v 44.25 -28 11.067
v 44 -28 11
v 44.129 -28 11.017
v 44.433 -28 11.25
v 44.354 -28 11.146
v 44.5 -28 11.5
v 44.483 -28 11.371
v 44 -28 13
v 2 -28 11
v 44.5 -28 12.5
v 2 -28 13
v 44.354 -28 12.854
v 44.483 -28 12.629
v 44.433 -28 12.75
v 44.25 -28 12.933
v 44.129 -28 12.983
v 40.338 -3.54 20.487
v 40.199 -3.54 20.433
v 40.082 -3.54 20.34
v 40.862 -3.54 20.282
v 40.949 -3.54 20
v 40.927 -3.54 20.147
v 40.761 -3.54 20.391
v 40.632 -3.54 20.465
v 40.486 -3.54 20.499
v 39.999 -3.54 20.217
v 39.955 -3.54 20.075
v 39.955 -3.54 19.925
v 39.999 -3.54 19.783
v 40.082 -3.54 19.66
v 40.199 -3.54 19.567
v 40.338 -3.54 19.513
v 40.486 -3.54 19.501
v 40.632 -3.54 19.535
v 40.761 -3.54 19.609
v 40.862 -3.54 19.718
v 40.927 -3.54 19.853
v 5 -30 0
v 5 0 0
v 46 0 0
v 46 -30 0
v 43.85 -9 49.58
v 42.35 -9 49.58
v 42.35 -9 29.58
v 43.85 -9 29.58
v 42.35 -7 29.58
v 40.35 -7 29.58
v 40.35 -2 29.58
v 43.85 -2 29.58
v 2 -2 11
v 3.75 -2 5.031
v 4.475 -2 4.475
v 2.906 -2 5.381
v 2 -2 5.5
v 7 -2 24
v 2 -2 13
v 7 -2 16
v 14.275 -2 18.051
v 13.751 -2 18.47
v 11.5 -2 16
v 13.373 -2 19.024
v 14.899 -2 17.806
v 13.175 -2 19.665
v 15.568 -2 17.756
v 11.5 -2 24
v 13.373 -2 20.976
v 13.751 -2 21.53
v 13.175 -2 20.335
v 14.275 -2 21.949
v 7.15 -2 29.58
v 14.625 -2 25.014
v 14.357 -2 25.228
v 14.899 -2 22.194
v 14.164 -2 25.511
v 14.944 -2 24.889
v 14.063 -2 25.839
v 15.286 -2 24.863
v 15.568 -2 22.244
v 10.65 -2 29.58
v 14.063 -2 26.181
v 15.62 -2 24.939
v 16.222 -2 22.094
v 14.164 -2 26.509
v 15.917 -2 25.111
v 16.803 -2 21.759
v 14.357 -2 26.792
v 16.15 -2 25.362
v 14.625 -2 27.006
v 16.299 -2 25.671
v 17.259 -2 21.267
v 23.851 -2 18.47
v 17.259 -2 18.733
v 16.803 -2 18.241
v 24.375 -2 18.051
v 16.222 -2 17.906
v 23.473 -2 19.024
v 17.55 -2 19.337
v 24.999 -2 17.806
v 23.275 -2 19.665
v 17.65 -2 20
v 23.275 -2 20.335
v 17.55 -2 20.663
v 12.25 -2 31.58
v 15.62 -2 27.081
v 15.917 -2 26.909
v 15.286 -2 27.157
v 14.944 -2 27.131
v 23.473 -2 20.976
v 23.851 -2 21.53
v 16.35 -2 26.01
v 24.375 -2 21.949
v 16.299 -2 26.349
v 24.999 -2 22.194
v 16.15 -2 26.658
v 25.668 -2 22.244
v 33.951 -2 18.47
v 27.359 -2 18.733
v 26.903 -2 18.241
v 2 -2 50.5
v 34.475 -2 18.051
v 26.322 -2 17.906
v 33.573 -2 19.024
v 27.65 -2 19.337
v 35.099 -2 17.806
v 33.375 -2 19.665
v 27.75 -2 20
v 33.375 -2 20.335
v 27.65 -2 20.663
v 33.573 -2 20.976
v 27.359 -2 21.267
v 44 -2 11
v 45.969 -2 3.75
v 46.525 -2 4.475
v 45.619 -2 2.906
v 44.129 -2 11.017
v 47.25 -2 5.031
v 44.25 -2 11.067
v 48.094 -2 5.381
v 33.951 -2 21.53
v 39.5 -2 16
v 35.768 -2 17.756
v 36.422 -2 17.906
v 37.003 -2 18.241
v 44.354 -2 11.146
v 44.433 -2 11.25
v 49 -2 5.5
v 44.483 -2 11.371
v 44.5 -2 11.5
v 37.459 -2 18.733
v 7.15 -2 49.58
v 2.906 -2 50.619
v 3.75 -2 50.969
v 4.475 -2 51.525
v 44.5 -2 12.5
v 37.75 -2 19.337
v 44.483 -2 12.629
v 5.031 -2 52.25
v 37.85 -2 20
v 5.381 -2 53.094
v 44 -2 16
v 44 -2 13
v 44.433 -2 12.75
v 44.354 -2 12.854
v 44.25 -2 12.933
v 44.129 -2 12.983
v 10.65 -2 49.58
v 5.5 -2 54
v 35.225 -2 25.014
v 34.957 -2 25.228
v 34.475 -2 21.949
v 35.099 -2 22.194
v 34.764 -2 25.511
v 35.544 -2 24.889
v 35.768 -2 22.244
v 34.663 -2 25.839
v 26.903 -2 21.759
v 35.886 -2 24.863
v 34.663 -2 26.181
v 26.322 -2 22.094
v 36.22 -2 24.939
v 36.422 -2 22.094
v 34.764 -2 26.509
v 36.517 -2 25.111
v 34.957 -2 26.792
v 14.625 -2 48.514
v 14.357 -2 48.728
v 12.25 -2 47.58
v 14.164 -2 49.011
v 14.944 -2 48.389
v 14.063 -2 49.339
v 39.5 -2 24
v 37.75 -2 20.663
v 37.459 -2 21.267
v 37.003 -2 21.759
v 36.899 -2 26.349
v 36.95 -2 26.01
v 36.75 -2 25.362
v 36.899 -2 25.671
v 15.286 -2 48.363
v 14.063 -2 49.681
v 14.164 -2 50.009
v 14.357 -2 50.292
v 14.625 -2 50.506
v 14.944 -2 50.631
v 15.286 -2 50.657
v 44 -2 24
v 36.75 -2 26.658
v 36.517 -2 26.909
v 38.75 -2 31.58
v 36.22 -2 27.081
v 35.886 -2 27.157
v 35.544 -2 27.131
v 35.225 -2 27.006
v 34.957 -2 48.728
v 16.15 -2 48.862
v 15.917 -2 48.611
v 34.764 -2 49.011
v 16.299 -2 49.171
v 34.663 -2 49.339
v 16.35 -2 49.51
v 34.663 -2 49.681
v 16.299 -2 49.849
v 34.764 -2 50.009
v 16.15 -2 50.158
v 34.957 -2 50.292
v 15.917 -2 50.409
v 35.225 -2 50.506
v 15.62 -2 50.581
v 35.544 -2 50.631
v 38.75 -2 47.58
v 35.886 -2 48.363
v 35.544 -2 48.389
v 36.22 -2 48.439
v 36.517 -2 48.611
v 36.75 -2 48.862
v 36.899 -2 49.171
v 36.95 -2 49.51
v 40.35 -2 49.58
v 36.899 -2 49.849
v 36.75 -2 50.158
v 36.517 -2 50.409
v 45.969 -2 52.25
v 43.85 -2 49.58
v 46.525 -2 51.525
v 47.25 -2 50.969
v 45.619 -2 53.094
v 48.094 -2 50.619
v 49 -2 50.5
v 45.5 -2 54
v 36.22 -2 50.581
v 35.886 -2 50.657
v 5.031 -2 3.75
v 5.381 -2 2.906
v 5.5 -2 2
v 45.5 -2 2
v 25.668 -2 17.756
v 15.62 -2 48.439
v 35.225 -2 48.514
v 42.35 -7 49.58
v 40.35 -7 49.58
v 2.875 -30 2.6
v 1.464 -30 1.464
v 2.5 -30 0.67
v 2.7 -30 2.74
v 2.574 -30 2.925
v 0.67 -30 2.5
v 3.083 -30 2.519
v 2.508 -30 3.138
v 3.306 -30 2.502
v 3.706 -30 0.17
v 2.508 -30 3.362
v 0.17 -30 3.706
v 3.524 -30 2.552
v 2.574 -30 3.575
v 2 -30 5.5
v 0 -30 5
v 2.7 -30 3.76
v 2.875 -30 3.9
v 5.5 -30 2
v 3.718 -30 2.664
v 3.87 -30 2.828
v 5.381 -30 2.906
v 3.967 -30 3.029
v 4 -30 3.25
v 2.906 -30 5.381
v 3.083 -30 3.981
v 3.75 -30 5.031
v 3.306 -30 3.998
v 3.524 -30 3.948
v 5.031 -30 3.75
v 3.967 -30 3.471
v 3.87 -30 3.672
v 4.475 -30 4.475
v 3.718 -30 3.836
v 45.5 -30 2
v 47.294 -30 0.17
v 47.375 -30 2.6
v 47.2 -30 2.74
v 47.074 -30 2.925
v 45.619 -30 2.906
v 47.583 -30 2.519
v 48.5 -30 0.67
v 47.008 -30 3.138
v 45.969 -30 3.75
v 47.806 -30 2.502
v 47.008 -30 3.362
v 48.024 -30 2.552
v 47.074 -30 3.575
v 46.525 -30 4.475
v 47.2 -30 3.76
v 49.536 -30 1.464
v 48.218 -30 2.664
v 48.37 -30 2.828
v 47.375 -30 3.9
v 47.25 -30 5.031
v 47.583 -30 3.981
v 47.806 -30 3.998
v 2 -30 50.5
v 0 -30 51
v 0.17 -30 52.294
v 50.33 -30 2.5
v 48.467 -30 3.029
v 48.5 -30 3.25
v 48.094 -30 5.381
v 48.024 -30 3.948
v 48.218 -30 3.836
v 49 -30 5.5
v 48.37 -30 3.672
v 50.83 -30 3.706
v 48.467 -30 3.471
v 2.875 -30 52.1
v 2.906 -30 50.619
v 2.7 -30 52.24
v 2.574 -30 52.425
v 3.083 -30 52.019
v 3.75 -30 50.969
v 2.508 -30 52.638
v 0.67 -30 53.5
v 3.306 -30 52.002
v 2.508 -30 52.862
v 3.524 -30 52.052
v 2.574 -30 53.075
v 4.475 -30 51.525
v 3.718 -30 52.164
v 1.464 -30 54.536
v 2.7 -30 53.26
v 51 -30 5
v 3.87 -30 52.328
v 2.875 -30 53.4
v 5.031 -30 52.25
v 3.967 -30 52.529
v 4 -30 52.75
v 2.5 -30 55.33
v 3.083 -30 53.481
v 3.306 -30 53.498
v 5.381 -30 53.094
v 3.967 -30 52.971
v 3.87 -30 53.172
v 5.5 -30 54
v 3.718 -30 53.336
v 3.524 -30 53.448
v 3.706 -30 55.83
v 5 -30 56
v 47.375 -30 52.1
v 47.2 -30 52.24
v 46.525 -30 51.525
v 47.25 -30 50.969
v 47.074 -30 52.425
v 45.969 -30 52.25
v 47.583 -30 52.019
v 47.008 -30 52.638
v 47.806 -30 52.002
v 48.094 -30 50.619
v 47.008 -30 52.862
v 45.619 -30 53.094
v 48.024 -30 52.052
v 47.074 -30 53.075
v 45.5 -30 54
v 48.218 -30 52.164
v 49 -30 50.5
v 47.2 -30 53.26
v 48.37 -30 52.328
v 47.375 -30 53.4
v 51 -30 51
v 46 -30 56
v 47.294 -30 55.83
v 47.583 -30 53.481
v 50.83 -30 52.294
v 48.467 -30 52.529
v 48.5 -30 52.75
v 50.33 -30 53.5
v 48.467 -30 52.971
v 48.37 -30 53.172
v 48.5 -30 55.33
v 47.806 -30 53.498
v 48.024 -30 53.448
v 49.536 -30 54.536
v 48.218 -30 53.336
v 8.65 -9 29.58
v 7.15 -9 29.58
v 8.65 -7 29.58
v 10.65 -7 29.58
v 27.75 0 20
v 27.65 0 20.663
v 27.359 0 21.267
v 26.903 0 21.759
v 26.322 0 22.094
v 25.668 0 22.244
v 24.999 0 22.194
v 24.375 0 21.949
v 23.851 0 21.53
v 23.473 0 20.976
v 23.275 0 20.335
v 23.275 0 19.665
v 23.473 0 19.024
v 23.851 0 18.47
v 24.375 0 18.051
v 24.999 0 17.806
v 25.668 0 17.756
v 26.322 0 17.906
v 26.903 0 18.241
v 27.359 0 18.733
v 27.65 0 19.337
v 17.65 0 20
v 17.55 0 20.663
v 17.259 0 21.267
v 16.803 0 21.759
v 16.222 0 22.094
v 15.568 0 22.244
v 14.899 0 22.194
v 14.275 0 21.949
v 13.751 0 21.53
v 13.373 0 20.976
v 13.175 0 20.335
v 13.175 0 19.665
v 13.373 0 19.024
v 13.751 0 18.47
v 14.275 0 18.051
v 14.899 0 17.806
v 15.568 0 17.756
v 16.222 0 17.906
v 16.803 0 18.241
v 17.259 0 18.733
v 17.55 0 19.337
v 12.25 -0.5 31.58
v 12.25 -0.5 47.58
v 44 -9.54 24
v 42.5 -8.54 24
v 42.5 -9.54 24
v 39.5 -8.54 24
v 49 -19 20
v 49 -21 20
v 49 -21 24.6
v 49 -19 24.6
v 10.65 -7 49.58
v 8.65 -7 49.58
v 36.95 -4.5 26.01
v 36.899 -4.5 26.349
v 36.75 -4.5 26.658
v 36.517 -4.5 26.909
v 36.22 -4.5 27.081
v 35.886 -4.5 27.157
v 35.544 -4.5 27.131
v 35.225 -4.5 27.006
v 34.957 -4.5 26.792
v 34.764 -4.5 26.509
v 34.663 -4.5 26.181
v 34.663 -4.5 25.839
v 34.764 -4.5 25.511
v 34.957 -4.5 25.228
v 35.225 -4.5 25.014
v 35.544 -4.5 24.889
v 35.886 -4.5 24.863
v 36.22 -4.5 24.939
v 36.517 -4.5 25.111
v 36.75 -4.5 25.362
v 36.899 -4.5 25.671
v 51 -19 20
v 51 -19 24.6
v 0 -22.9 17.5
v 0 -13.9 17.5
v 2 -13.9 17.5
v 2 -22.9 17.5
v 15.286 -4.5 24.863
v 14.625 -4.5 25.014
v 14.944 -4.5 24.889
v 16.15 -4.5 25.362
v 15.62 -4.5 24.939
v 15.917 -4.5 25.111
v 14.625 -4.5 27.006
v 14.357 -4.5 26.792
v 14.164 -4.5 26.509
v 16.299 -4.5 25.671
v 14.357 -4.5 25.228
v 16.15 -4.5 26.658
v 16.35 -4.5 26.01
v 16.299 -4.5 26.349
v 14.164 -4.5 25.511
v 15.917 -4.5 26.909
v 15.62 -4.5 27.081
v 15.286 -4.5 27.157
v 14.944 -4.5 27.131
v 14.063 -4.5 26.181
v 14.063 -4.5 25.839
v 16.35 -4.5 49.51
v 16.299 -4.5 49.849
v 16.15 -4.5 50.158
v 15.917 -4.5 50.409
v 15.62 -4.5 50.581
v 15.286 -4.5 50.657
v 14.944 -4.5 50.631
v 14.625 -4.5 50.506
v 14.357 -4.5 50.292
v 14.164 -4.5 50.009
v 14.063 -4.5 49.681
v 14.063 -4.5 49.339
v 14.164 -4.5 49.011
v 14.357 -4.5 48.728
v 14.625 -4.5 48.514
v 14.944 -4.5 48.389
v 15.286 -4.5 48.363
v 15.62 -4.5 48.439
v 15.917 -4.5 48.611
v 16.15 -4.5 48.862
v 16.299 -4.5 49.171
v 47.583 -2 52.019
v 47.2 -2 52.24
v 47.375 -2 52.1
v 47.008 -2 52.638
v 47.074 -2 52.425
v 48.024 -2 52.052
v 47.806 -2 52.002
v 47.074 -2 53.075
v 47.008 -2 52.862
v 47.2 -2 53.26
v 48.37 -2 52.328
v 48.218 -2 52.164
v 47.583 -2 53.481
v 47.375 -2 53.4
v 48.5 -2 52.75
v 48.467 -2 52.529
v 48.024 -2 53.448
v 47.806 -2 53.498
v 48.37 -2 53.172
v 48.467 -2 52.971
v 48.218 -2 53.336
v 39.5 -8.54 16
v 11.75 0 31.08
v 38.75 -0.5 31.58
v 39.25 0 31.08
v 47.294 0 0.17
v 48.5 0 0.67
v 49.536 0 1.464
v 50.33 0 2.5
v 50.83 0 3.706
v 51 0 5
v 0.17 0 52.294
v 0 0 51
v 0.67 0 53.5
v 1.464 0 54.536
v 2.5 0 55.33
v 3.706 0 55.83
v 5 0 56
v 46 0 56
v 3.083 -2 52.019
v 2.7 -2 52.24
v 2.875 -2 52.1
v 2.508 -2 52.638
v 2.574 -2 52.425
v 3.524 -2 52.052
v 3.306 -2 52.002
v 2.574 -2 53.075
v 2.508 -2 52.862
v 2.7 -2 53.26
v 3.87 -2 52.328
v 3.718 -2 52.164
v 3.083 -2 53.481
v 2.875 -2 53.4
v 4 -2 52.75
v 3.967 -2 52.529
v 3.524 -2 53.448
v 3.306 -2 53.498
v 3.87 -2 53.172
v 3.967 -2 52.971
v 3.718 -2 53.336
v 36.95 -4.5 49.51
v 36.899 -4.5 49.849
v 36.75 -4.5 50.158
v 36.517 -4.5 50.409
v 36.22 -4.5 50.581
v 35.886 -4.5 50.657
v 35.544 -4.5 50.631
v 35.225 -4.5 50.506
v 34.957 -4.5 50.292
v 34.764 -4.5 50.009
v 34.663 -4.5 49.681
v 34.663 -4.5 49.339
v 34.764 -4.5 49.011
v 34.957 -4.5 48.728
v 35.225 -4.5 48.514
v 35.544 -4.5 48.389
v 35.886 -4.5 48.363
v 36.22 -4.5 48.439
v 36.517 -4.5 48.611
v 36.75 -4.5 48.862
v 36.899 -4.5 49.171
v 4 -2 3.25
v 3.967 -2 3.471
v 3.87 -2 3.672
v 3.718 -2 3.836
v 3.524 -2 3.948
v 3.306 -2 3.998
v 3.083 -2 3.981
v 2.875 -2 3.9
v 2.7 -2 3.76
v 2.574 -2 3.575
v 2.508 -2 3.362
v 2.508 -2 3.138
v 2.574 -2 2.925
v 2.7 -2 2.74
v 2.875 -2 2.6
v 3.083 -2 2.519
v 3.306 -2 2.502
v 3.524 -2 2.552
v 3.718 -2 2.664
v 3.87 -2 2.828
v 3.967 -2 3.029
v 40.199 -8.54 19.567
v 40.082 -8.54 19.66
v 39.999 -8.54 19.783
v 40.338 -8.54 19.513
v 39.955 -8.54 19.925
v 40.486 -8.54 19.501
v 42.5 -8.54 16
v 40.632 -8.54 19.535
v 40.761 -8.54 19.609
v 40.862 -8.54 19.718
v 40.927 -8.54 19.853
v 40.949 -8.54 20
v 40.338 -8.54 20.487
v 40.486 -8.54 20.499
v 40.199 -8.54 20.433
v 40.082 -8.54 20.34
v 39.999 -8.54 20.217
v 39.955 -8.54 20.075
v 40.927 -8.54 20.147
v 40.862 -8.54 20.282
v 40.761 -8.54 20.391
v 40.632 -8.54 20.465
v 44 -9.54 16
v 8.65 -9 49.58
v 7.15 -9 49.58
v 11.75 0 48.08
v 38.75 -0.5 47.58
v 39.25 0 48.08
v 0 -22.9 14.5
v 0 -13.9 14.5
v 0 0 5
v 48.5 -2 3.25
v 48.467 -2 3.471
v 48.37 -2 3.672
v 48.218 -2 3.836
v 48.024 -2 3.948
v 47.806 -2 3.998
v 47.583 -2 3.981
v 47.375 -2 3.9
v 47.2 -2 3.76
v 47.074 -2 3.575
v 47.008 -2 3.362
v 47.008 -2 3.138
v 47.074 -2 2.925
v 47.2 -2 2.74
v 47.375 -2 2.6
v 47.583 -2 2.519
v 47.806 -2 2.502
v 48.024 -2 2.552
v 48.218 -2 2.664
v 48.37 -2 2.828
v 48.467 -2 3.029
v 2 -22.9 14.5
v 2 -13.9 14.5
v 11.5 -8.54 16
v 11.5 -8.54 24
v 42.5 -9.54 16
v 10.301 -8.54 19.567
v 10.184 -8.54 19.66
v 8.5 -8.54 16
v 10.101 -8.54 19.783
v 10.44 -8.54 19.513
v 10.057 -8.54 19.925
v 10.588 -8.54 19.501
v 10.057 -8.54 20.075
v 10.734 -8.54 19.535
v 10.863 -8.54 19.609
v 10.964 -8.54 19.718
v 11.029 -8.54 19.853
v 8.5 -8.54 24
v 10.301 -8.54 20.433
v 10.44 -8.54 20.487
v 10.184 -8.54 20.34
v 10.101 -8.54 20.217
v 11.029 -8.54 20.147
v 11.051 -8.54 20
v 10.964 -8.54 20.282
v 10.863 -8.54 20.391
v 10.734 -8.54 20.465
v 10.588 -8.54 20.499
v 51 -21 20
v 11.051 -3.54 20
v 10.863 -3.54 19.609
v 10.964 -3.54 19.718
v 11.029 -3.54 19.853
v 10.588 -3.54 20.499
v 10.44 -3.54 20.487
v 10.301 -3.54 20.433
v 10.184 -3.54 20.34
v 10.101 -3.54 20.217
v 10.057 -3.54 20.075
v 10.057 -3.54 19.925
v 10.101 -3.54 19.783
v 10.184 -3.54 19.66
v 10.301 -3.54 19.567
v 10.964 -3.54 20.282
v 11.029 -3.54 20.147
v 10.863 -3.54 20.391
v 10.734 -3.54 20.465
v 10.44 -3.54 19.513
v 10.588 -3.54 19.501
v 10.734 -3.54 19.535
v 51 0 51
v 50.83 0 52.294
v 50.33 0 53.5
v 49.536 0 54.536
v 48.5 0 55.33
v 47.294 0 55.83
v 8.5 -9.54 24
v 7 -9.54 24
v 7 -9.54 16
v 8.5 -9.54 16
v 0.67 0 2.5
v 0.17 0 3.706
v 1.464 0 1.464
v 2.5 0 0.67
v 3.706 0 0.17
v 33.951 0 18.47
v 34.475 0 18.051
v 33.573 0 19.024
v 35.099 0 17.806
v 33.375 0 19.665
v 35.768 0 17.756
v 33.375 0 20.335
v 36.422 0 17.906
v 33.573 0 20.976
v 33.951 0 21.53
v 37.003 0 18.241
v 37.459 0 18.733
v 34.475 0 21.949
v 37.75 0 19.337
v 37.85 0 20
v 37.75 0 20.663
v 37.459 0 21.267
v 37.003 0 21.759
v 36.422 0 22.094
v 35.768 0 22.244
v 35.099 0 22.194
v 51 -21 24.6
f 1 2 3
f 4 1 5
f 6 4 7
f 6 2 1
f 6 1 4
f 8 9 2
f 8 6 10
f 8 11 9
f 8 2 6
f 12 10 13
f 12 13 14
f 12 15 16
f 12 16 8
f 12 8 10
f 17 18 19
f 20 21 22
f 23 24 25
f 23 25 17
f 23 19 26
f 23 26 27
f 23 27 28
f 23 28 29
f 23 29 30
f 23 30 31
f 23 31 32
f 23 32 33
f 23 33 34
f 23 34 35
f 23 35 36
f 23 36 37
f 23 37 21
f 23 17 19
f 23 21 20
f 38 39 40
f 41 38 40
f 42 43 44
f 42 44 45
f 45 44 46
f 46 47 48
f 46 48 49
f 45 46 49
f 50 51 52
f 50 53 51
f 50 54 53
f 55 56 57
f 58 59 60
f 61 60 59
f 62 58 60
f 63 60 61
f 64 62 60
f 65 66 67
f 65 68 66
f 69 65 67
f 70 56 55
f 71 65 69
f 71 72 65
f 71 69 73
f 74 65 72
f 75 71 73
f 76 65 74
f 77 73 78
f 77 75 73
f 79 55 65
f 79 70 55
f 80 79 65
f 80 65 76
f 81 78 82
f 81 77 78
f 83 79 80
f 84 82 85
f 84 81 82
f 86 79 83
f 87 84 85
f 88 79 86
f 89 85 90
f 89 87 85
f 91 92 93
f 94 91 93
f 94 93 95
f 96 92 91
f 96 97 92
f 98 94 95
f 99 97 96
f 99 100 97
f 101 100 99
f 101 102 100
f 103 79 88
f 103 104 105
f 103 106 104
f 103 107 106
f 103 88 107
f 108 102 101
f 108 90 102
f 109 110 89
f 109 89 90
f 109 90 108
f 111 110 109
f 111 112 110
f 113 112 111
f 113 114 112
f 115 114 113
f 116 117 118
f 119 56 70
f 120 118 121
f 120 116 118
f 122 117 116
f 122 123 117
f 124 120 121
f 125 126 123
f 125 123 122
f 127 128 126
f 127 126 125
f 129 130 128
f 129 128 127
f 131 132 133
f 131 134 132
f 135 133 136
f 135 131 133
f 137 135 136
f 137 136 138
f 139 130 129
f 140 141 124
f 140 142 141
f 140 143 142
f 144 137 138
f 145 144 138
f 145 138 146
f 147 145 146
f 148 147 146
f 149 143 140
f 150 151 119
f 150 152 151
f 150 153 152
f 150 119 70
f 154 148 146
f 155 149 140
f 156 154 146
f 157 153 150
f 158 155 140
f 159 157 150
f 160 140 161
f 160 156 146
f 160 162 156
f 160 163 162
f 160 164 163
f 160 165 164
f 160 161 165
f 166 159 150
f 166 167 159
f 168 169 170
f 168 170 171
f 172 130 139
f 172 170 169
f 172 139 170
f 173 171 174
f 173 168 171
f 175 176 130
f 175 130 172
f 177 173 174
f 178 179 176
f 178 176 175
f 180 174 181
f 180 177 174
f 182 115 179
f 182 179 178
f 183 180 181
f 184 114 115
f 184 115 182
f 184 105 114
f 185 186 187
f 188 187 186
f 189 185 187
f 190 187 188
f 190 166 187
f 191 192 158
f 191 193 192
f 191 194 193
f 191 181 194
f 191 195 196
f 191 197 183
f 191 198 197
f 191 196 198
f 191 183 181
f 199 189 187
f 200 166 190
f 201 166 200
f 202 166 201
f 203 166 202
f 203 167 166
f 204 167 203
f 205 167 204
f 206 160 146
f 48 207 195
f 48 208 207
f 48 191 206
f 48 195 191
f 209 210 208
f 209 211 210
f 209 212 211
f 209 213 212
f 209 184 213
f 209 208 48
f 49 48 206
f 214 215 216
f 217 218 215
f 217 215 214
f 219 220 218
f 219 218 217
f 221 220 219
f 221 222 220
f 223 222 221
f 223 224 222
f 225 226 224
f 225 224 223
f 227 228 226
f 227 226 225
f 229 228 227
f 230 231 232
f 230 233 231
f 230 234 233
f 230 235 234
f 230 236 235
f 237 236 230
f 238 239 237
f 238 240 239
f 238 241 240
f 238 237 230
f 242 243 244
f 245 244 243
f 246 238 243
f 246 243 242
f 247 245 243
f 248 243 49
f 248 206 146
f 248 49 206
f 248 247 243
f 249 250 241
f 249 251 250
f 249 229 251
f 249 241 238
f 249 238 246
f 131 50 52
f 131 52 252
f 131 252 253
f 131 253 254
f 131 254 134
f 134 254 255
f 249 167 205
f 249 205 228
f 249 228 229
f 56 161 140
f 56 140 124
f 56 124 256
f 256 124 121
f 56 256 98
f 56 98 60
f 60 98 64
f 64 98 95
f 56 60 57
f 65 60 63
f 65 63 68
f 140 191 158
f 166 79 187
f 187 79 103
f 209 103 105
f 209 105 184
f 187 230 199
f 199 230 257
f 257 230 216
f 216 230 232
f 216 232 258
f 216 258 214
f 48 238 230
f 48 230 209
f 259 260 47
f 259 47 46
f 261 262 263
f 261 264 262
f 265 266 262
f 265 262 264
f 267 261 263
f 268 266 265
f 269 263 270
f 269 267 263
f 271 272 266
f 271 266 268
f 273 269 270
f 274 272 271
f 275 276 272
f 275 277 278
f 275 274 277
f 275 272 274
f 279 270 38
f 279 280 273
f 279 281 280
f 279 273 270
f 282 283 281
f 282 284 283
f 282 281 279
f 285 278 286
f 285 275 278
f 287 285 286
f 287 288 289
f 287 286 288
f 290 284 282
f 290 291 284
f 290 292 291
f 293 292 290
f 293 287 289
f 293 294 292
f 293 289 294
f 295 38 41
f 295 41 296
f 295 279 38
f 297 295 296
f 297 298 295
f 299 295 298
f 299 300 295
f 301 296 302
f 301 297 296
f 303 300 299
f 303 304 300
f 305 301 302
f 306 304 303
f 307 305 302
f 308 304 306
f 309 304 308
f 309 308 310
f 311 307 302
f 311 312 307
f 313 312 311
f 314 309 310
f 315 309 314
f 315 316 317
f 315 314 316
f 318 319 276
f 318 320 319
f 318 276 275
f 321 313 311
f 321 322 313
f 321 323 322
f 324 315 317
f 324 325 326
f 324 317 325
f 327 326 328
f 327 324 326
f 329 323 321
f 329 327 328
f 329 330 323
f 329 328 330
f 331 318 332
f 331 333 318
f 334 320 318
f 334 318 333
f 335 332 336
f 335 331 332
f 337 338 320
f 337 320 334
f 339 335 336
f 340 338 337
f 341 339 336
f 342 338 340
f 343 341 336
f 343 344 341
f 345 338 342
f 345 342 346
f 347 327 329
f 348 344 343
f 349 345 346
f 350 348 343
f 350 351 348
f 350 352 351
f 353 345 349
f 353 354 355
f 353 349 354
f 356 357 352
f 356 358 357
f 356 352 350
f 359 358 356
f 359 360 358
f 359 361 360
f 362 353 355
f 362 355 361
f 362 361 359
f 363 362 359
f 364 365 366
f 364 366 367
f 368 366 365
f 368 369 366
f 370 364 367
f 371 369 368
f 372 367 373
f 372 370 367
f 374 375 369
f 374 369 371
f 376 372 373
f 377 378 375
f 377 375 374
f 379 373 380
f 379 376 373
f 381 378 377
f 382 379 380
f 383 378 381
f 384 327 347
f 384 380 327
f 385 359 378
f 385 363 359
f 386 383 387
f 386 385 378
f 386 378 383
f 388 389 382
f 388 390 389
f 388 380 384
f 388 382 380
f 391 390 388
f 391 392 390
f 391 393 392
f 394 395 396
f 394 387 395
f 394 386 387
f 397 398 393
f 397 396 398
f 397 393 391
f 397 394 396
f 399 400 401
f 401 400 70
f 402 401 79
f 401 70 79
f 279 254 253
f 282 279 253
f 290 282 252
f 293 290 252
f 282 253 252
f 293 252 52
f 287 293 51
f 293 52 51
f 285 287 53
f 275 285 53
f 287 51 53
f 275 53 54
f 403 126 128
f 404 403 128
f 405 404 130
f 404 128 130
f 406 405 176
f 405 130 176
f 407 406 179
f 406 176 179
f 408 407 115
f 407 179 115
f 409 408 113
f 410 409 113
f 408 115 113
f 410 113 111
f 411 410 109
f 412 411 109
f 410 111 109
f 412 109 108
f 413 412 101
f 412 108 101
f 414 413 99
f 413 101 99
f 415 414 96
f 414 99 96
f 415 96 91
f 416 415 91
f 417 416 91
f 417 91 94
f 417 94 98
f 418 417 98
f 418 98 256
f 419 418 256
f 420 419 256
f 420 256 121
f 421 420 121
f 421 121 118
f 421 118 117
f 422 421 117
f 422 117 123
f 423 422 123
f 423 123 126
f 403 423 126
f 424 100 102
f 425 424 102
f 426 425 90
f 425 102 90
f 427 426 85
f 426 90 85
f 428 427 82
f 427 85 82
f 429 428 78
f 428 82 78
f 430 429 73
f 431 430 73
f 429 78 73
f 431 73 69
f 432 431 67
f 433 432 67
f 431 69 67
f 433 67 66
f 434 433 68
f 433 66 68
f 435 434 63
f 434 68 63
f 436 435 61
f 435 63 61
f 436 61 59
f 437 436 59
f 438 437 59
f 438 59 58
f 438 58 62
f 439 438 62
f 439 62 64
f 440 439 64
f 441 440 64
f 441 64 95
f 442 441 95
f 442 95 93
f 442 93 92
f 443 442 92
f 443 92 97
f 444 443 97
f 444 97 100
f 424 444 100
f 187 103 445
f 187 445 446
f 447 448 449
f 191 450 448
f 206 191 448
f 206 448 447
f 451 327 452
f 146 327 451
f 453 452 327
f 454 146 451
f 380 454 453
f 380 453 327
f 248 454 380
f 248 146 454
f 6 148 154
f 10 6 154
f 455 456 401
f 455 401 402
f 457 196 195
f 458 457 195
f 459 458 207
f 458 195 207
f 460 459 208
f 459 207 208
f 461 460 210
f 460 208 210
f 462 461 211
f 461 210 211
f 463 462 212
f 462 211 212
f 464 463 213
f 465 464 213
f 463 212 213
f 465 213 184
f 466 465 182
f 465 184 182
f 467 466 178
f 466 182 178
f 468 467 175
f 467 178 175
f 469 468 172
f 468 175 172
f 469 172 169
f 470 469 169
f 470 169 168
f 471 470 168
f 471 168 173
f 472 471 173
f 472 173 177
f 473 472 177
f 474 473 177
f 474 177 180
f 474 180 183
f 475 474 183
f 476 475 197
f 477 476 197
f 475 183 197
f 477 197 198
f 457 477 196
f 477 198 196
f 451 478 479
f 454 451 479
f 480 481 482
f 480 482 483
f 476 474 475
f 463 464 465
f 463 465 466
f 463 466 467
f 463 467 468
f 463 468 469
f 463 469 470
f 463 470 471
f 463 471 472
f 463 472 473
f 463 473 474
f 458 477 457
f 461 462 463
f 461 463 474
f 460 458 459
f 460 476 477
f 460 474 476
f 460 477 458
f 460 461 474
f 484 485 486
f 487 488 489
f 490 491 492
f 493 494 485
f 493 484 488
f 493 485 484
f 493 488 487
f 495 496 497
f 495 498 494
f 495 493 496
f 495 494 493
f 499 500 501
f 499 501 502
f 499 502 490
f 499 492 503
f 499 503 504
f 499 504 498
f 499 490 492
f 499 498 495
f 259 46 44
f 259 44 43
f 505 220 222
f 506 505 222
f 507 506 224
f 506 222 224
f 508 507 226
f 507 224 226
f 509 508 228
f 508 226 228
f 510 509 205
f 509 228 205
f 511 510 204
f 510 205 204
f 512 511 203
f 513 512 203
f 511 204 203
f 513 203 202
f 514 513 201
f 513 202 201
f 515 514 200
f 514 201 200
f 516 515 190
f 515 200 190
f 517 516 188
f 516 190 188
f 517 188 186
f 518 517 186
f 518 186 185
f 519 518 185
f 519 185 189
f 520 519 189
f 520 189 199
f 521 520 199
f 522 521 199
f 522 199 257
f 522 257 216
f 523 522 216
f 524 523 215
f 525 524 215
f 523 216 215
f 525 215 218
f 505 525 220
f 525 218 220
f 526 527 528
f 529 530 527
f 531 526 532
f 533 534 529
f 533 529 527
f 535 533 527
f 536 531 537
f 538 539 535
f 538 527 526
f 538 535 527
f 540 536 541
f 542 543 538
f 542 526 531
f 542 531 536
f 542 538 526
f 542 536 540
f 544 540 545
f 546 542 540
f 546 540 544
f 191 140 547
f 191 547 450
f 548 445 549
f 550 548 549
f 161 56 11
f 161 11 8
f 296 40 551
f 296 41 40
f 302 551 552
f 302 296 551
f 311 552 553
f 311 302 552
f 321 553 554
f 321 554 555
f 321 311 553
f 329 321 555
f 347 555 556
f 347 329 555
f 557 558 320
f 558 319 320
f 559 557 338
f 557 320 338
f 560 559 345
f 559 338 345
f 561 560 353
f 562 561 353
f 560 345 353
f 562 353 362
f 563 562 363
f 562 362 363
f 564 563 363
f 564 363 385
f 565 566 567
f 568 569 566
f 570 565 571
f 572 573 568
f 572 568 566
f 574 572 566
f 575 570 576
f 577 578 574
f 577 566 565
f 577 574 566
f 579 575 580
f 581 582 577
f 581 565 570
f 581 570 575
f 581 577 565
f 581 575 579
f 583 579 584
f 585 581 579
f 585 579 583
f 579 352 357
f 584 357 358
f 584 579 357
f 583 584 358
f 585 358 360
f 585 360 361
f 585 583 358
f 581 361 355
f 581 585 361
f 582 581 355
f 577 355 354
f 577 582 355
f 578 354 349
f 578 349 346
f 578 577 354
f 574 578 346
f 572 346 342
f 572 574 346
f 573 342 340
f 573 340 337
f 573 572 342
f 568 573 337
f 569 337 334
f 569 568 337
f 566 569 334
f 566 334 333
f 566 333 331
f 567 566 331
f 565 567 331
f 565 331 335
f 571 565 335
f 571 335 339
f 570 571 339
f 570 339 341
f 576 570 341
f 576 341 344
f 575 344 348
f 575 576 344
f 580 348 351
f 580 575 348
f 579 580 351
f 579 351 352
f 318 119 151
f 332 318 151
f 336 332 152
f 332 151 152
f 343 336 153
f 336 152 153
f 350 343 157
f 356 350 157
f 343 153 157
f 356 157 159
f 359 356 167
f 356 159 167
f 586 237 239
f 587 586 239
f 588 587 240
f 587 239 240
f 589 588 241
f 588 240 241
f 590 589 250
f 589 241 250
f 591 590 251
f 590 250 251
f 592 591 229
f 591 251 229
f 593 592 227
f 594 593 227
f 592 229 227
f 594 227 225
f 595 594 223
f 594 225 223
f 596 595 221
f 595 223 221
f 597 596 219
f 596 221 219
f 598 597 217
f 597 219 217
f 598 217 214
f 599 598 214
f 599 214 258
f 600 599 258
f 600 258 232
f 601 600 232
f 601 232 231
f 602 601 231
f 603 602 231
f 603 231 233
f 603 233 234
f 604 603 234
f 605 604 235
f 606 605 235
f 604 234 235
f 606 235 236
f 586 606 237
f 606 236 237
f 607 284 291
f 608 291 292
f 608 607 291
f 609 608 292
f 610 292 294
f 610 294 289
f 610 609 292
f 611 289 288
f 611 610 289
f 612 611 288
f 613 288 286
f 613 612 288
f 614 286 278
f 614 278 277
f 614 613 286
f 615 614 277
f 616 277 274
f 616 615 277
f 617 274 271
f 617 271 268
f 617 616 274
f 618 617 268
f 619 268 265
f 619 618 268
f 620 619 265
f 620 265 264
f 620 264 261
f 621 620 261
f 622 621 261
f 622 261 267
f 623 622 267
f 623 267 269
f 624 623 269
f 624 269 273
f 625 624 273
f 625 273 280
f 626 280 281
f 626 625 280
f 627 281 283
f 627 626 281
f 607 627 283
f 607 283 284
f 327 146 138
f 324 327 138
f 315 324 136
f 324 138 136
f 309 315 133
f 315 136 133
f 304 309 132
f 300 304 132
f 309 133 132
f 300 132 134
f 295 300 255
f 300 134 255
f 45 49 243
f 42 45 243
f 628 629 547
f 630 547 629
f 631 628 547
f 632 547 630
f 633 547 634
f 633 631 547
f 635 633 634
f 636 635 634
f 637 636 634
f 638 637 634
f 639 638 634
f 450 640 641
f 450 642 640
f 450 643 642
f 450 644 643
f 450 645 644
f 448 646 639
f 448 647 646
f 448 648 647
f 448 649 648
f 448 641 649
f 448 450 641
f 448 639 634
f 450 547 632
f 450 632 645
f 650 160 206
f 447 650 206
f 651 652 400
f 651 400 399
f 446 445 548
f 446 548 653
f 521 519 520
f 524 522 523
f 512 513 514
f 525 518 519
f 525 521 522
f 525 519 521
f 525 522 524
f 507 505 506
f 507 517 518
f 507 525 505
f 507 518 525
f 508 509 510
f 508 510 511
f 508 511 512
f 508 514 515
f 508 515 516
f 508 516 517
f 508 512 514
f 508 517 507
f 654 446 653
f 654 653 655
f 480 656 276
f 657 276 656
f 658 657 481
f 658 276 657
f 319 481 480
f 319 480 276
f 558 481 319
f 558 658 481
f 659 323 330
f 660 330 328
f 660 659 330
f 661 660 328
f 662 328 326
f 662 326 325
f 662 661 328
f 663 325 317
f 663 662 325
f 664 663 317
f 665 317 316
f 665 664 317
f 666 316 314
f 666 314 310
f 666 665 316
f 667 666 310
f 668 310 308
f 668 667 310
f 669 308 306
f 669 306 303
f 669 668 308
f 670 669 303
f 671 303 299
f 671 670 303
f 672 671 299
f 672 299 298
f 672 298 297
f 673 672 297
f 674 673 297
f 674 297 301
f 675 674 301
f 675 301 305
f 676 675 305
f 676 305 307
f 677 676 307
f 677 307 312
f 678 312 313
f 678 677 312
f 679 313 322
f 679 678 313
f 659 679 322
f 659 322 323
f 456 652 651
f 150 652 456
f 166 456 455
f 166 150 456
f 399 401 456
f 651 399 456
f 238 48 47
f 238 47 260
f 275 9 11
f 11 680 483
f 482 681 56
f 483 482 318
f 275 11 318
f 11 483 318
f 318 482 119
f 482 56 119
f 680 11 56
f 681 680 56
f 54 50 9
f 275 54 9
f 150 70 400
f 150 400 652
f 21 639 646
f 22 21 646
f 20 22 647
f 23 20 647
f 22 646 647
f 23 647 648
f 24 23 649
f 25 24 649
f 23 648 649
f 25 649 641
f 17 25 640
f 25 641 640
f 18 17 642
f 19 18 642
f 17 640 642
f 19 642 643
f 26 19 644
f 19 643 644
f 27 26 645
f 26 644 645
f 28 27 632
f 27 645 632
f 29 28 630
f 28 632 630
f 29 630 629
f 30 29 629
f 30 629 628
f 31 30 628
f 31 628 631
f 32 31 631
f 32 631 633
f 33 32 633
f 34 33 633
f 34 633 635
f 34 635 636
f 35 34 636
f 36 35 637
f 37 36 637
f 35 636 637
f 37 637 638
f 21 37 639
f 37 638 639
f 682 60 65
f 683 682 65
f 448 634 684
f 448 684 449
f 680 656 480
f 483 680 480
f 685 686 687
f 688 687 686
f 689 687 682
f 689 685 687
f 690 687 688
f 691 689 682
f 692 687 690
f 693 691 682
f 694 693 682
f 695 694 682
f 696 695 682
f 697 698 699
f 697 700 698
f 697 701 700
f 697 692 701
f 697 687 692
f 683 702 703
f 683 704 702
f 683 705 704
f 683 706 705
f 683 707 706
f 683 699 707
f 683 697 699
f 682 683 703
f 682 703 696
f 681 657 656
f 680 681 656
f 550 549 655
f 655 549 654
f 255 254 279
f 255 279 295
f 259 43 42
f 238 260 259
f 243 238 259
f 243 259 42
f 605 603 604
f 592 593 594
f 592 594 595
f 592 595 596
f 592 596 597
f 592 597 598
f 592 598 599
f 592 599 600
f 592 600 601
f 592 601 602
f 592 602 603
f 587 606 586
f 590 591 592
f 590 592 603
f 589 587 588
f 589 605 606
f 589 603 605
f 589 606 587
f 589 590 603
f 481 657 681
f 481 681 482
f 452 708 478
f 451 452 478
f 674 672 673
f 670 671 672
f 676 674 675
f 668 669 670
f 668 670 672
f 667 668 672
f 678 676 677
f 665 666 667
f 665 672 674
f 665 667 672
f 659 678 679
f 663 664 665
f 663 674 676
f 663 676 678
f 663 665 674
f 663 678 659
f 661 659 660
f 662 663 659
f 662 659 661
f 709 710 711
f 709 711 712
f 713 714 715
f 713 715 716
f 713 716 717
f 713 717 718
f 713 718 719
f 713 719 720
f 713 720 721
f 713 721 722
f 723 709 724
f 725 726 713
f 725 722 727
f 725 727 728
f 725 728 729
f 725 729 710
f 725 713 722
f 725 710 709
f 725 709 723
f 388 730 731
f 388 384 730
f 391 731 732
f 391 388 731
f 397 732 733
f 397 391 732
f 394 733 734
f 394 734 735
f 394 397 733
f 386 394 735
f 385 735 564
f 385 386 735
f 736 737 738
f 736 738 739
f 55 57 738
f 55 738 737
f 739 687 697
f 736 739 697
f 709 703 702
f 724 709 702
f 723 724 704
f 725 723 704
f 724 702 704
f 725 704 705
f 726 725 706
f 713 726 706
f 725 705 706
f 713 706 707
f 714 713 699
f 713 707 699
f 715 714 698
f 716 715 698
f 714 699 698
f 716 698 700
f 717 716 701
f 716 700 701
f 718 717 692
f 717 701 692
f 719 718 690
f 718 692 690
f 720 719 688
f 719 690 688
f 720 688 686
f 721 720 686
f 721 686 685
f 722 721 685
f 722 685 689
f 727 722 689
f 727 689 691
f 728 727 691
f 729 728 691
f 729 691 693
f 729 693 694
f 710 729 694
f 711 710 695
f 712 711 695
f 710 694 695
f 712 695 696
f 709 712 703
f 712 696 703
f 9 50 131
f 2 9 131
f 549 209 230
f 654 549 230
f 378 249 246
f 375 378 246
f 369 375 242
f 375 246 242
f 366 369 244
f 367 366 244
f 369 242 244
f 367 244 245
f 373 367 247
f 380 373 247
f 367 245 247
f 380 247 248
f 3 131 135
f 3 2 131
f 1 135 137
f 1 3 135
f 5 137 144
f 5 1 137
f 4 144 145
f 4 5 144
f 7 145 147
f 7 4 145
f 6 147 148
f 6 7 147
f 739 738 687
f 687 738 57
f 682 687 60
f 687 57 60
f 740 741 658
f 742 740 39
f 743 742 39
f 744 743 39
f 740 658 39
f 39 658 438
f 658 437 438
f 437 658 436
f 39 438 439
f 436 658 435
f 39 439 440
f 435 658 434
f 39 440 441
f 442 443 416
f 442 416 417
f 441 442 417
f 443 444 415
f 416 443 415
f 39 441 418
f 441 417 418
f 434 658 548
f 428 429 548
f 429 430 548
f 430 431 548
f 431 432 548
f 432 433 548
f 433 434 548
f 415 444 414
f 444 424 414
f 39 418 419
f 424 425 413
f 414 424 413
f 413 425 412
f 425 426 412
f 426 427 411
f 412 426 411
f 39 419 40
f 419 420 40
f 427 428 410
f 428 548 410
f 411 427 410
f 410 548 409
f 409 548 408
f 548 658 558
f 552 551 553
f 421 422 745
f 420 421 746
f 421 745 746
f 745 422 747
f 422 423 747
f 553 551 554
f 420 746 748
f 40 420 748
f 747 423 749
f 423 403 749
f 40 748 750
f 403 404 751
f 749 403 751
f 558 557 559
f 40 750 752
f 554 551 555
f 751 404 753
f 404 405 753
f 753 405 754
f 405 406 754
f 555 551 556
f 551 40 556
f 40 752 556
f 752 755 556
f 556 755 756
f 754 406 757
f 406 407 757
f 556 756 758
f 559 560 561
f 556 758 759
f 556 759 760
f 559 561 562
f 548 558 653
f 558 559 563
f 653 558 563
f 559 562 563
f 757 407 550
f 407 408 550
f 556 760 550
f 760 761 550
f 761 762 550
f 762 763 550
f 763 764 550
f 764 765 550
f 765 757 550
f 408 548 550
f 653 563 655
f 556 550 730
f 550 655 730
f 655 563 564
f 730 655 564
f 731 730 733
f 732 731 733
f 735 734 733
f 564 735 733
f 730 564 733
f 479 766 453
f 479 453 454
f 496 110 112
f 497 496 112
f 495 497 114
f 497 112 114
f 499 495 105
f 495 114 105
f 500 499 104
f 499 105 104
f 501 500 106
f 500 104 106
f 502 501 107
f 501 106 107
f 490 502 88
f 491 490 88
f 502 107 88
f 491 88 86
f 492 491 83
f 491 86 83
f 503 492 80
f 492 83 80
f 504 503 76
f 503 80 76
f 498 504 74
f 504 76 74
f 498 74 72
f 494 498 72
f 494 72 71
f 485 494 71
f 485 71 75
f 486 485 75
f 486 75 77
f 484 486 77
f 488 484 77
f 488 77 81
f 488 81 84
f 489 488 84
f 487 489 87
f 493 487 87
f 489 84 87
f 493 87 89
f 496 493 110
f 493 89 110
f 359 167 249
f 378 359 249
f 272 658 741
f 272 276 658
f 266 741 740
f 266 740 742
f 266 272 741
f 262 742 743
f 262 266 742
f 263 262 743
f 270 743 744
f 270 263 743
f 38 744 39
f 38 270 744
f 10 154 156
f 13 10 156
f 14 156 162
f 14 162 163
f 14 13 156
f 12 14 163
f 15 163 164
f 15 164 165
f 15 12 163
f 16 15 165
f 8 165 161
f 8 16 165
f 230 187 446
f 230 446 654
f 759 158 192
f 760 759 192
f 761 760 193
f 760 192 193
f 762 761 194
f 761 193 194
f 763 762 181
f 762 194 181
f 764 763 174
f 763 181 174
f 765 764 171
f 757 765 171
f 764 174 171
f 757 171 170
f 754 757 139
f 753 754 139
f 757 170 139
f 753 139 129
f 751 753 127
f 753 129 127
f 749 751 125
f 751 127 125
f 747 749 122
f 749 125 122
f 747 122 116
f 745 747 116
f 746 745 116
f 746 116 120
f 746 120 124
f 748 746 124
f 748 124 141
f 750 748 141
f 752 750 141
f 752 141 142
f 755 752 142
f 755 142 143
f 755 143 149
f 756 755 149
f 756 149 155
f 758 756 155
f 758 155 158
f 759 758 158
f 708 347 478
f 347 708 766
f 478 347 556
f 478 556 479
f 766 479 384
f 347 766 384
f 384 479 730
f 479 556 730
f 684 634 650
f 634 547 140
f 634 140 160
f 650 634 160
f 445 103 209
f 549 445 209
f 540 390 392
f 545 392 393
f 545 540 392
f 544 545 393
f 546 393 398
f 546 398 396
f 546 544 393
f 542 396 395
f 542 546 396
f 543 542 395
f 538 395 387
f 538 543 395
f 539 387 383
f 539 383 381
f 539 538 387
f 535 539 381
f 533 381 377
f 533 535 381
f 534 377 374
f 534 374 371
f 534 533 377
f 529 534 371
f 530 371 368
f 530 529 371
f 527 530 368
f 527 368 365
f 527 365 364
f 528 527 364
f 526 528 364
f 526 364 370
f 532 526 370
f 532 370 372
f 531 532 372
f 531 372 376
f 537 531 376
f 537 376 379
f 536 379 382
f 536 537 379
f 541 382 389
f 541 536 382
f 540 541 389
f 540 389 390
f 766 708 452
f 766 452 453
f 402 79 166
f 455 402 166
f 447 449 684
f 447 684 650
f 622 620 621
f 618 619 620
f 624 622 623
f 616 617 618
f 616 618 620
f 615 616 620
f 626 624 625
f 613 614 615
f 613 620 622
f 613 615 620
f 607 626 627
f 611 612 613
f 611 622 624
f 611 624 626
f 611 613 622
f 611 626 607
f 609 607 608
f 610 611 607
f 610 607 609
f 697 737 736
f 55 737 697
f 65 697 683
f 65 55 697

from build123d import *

# Parameters (mm, degrees)
F0_W      = 51
F0_H      = 56
F1_DEPTH  = 30
F2_T      = -2
F3_R      = 5
F4_W      = 26.5
F4_H      = 16
F5_DEPTH  = 2.001
F6_SIZE   = 0.5
F7_W      = 42.5
F7_H      = 2
F8_DEPTH  = 26
F9_R      = 0.5
F10_W     = 9
F10_H     = 3
F11_DEPTH = 3
F12_W     = 2
F12_H     = 20
F13_DEPTH = 5
F12_W_2   = 1.5
F14_DEPTH = 7
F15_W     = 3
F15_H     = 8
F16_DEPTH = 6.54
F17_R     = 2.25
F18_DEPTH = 2.001
F15_W_2   = 1.5
F19_DEPTH = 7.54
F20_R     = 0.5
F21_DEPTH = 5
F22_R     = 1.15
F23_DEPTH = 2.5
F24_R     = 0.75
F25_DEPTH = 28
F26_W     = 2
F26_H     = 4.6
F27_DEPTH = 2


with BuildPart() as f1:
    # F0 (on Front) → F1 (new body)
    with BuildSketch(Plane.XZ):
        with Locations((25.5, 28)):
            Rectangle(F0_W, F0_H)
    extrude(amount=F1_DEPTH)

    # F2
    f2_openings = [f1.faces().sort_by_distance(p)[0] for p in [
        (25.5, -30, 28),
    ]]
    offset(amount=F2_T, openings=f2_openings)

    # F3
    f3_edges = [f1.edges().sort_by_distance(p)[0] for p in [
        (0, -15, 56),
        (0, -15, 0),
        (51, -15, 0),
        (51, -15, 56),
    ]]
    fillet(f3_edges, radius=F3_R)

    # F4 (on face) → F5 (cut, through all)
    with BuildSketch(Plane.XZ.offset(2)):
        with Locations((25.5, 39.58)):
            Rectangle(F4_W, F4_H)
    extrude(amount=-F5_DEPTH, mode=Mode.SUBTRACT)

    # F6
    f6_edges = [f1.edges().sort_by_distance(p)[0] for p in [
        (25.5, 0, 47.58),
        (38.75, 0, 39.58),
        (25.5, 0, 31.58),
        (12.25, 0, 39.58),
    ]]
    chamfer(f6_edges, length=F6_SIZE)

    # F7 (on face) → F8 (join)
    with BuildSketch(Plane.XZ.offset(2)):
        with Locations((23.25, 12)):
            Rectangle(F7_W, F7_H)
    extrude(amount=F8_DEPTH)

    # F9
    f9_edges = [f1.edges().sort_by_distance(p)[0] for p in [
        (44.5, -15, 11),
        (44.5, -15, 13),
    ]]
    fillet(f9_edges, radius=F9_R)

    # F10 (on face) → F11 (cut)
    with BuildSketch(Plane(origin=(0, 0, 0), x_dir=(0, -1, 0), z_dir=(-1, 0, 0))):
        with Locations((18.4, 16)):
            Rectangle(F10_W, F10_H)
    extrude(amount=-F11_DEPTH, mode=Mode.SUBTRACT)

    # F12 (on face) → F13 (join)
    with BuildSketch(Plane.XZ.offset(2)):
        with Locations((9.65, 39.58)):
            Rectangle(F12_W, F12_H)
        with Locations((41.35, 39.58)):
            Rectangle(F12_W, F12_H)
    extrude(amount=F13_DEPTH)

    # F12 (on face) → F14 (join)
    with BuildSketch(Plane.XZ.offset(2)):
        with Locations((7.9, 39.58)):
            Rectangle(F12_W_2, F12_H)
        with Locations((43.1, 39.58)):
            Rectangle(F12_W_2, F12_H)
    extrude(amount=F14_DEPTH)

    # F15 (on face) → F16 (join)
    with BuildSketch(Plane.XZ.offset(2)):
        with Locations((10, 20)):
            Rectangle(F15_W, F15_H)
        with Locations((41, 20)):
            Rectangle(F15_W, F15_H)
    extrude(amount=F16_DEPTH)

    # F17 (on face) → F18 (cut, through all)
    with BuildSketch(Plane.XZ.offset(2)):
        with Locations((15.4, 20)):
            Circle(F17_R)
        with Locations((25.5, 20)):
            Circle(F17_R)
        with Locations((35.6, 20)):
            Circle(F17_R)
    extrude(amount=-F18_DEPTH, mode=Mode.SUBTRACT)

    # F15 (on face) → F19 (join)
    with BuildSketch(Plane.XZ.offset(2)):
        with Locations((7.75, 20)):
            Rectangle(F15_W_2, F15_H)
        with Locations((43.25, 20)):
            Rectangle(F15_W_2, F15_H)
    extrude(amount=F19_DEPTH)

    # F20 (on face) → F21 (cut)
    with BuildSketch(Plane.XZ.offset(8.54)):
        with Locations((10.551, 20)):
            Circle(F20_R)
        with Locations((40.449, 20)):
            Circle(F20_R)
    extrude(amount=-F21_DEPTH, mode=Mode.SUBTRACT)

    # F22 (on face) → F23 (join)
    with BuildSketch(Plane.XZ.offset(2)):
        with Locations((15.2, 49.51)):
            Circle(F22_R)
        with Locations((35.8, 49.51)):
            Circle(F22_R)
        with Locations((35.8, 26.01)):
            Circle(F22_R)
        with Locations((15.2, 26.01)):
            Circle(F22_R)
    extrude(amount=F23_DEPTH)

    # F24 (on face) → F25 (join)
    with BuildSketch(Plane.XZ.offset(2)):
        with BuildLine():
            Line((5.5, 54), (2, 54))
            Line((2, 54), (2, 50.5))
            ThreePointArc((2, 50.5), (4.474874, 51.525126), (5.5, 54))
        make_face()
        with Locations((3.25, 52.75)):
            Circle(F24_R, mode=Mode.SUBTRACT)
        with BuildLine():
            Line((49, 50.5), (49, 54))
            Line((49, 54), (45.5, 54))
            ThreePointArc((45.5, 54), (46.525126, 51.525126), (49, 50.5))
        make_face()
        with Locations((47.75, 52.75)):
            Circle(F24_R, mode=Mode.SUBTRACT)
        with BuildLine():
            Line((45.5, 2), (49, 2))
            Line((49, 2), (49, 5.5))
            ThreePointArc((49, 5.5), (46.525126, 4.474874), (45.5, 2))
        make_face()
        with Locations((47.75, 3.25)):
            Circle(F24_R, mode=Mode.SUBTRACT)
        with BuildLine():
            Line((2, 5.5), (2, 2))
            Line((2, 2), (5.5, 2))
            ThreePointArc((5.5, 2), (4.474874, 4.474874), (2, 5.5))
        make_face()
        with Locations((3.25, 3.25)):
            Circle(F24_R, mode=Mode.SUBTRACT)
    extrude(amount=F25_DEPTH)

    # F26 (on face) → F27 (cut)
    with BuildSketch(Plane.YZ.offset(51)):
        with Locations((-20, 22.3)):
            Rectangle(F26_W, F26_H)
    extrude(amount=-F27_DEPTH, mode=Mode.SUBTRACT)


solid = f1.part
